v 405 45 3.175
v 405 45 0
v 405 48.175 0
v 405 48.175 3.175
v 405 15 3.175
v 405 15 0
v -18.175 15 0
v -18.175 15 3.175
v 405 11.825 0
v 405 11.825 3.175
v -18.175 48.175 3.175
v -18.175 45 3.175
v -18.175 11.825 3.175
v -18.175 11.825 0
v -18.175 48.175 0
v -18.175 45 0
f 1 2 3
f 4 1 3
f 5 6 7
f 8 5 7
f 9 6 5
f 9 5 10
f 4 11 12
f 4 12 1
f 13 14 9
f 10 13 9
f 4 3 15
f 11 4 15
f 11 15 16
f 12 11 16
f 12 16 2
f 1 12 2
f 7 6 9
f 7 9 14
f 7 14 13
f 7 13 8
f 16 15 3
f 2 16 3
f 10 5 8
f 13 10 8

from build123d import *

# Parameters (mm, degrees)
BOSS_EXTRUDE1_DEPTH   = 3.175
BOSS_EXTRUDE1_2_DEPTH = 3.175


with BuildPart() as part:
    # Sketch1 → Boss-Extrude1 (new body)
    with BuildSketch(Plane.XY):
        Polygon((15, 45), (405, 45), (405, 48.175), (18.175, 48.175), (-18.175, 48.175), (-18.175, 45), (-15, 45), align=None)
    extrude(amount=BOSS_EXTRUDE1_DEPTH)


with BuildPart() as body_2:
    # Sketch1 → Boss-Extrude1 2 (new body)
    with BuildSketch(Plane.XY):
        Polygon((-18.175, 15), (-15, 15), (15, 15), (405, 15), (405, 11.825), (18.175, 11.825), (-18.175, 11.825), align=None)
    extrude(amount=BOSS_EXTRUDE1_2_DEPTH)


solid = Compound([part.part, body_2.part])
